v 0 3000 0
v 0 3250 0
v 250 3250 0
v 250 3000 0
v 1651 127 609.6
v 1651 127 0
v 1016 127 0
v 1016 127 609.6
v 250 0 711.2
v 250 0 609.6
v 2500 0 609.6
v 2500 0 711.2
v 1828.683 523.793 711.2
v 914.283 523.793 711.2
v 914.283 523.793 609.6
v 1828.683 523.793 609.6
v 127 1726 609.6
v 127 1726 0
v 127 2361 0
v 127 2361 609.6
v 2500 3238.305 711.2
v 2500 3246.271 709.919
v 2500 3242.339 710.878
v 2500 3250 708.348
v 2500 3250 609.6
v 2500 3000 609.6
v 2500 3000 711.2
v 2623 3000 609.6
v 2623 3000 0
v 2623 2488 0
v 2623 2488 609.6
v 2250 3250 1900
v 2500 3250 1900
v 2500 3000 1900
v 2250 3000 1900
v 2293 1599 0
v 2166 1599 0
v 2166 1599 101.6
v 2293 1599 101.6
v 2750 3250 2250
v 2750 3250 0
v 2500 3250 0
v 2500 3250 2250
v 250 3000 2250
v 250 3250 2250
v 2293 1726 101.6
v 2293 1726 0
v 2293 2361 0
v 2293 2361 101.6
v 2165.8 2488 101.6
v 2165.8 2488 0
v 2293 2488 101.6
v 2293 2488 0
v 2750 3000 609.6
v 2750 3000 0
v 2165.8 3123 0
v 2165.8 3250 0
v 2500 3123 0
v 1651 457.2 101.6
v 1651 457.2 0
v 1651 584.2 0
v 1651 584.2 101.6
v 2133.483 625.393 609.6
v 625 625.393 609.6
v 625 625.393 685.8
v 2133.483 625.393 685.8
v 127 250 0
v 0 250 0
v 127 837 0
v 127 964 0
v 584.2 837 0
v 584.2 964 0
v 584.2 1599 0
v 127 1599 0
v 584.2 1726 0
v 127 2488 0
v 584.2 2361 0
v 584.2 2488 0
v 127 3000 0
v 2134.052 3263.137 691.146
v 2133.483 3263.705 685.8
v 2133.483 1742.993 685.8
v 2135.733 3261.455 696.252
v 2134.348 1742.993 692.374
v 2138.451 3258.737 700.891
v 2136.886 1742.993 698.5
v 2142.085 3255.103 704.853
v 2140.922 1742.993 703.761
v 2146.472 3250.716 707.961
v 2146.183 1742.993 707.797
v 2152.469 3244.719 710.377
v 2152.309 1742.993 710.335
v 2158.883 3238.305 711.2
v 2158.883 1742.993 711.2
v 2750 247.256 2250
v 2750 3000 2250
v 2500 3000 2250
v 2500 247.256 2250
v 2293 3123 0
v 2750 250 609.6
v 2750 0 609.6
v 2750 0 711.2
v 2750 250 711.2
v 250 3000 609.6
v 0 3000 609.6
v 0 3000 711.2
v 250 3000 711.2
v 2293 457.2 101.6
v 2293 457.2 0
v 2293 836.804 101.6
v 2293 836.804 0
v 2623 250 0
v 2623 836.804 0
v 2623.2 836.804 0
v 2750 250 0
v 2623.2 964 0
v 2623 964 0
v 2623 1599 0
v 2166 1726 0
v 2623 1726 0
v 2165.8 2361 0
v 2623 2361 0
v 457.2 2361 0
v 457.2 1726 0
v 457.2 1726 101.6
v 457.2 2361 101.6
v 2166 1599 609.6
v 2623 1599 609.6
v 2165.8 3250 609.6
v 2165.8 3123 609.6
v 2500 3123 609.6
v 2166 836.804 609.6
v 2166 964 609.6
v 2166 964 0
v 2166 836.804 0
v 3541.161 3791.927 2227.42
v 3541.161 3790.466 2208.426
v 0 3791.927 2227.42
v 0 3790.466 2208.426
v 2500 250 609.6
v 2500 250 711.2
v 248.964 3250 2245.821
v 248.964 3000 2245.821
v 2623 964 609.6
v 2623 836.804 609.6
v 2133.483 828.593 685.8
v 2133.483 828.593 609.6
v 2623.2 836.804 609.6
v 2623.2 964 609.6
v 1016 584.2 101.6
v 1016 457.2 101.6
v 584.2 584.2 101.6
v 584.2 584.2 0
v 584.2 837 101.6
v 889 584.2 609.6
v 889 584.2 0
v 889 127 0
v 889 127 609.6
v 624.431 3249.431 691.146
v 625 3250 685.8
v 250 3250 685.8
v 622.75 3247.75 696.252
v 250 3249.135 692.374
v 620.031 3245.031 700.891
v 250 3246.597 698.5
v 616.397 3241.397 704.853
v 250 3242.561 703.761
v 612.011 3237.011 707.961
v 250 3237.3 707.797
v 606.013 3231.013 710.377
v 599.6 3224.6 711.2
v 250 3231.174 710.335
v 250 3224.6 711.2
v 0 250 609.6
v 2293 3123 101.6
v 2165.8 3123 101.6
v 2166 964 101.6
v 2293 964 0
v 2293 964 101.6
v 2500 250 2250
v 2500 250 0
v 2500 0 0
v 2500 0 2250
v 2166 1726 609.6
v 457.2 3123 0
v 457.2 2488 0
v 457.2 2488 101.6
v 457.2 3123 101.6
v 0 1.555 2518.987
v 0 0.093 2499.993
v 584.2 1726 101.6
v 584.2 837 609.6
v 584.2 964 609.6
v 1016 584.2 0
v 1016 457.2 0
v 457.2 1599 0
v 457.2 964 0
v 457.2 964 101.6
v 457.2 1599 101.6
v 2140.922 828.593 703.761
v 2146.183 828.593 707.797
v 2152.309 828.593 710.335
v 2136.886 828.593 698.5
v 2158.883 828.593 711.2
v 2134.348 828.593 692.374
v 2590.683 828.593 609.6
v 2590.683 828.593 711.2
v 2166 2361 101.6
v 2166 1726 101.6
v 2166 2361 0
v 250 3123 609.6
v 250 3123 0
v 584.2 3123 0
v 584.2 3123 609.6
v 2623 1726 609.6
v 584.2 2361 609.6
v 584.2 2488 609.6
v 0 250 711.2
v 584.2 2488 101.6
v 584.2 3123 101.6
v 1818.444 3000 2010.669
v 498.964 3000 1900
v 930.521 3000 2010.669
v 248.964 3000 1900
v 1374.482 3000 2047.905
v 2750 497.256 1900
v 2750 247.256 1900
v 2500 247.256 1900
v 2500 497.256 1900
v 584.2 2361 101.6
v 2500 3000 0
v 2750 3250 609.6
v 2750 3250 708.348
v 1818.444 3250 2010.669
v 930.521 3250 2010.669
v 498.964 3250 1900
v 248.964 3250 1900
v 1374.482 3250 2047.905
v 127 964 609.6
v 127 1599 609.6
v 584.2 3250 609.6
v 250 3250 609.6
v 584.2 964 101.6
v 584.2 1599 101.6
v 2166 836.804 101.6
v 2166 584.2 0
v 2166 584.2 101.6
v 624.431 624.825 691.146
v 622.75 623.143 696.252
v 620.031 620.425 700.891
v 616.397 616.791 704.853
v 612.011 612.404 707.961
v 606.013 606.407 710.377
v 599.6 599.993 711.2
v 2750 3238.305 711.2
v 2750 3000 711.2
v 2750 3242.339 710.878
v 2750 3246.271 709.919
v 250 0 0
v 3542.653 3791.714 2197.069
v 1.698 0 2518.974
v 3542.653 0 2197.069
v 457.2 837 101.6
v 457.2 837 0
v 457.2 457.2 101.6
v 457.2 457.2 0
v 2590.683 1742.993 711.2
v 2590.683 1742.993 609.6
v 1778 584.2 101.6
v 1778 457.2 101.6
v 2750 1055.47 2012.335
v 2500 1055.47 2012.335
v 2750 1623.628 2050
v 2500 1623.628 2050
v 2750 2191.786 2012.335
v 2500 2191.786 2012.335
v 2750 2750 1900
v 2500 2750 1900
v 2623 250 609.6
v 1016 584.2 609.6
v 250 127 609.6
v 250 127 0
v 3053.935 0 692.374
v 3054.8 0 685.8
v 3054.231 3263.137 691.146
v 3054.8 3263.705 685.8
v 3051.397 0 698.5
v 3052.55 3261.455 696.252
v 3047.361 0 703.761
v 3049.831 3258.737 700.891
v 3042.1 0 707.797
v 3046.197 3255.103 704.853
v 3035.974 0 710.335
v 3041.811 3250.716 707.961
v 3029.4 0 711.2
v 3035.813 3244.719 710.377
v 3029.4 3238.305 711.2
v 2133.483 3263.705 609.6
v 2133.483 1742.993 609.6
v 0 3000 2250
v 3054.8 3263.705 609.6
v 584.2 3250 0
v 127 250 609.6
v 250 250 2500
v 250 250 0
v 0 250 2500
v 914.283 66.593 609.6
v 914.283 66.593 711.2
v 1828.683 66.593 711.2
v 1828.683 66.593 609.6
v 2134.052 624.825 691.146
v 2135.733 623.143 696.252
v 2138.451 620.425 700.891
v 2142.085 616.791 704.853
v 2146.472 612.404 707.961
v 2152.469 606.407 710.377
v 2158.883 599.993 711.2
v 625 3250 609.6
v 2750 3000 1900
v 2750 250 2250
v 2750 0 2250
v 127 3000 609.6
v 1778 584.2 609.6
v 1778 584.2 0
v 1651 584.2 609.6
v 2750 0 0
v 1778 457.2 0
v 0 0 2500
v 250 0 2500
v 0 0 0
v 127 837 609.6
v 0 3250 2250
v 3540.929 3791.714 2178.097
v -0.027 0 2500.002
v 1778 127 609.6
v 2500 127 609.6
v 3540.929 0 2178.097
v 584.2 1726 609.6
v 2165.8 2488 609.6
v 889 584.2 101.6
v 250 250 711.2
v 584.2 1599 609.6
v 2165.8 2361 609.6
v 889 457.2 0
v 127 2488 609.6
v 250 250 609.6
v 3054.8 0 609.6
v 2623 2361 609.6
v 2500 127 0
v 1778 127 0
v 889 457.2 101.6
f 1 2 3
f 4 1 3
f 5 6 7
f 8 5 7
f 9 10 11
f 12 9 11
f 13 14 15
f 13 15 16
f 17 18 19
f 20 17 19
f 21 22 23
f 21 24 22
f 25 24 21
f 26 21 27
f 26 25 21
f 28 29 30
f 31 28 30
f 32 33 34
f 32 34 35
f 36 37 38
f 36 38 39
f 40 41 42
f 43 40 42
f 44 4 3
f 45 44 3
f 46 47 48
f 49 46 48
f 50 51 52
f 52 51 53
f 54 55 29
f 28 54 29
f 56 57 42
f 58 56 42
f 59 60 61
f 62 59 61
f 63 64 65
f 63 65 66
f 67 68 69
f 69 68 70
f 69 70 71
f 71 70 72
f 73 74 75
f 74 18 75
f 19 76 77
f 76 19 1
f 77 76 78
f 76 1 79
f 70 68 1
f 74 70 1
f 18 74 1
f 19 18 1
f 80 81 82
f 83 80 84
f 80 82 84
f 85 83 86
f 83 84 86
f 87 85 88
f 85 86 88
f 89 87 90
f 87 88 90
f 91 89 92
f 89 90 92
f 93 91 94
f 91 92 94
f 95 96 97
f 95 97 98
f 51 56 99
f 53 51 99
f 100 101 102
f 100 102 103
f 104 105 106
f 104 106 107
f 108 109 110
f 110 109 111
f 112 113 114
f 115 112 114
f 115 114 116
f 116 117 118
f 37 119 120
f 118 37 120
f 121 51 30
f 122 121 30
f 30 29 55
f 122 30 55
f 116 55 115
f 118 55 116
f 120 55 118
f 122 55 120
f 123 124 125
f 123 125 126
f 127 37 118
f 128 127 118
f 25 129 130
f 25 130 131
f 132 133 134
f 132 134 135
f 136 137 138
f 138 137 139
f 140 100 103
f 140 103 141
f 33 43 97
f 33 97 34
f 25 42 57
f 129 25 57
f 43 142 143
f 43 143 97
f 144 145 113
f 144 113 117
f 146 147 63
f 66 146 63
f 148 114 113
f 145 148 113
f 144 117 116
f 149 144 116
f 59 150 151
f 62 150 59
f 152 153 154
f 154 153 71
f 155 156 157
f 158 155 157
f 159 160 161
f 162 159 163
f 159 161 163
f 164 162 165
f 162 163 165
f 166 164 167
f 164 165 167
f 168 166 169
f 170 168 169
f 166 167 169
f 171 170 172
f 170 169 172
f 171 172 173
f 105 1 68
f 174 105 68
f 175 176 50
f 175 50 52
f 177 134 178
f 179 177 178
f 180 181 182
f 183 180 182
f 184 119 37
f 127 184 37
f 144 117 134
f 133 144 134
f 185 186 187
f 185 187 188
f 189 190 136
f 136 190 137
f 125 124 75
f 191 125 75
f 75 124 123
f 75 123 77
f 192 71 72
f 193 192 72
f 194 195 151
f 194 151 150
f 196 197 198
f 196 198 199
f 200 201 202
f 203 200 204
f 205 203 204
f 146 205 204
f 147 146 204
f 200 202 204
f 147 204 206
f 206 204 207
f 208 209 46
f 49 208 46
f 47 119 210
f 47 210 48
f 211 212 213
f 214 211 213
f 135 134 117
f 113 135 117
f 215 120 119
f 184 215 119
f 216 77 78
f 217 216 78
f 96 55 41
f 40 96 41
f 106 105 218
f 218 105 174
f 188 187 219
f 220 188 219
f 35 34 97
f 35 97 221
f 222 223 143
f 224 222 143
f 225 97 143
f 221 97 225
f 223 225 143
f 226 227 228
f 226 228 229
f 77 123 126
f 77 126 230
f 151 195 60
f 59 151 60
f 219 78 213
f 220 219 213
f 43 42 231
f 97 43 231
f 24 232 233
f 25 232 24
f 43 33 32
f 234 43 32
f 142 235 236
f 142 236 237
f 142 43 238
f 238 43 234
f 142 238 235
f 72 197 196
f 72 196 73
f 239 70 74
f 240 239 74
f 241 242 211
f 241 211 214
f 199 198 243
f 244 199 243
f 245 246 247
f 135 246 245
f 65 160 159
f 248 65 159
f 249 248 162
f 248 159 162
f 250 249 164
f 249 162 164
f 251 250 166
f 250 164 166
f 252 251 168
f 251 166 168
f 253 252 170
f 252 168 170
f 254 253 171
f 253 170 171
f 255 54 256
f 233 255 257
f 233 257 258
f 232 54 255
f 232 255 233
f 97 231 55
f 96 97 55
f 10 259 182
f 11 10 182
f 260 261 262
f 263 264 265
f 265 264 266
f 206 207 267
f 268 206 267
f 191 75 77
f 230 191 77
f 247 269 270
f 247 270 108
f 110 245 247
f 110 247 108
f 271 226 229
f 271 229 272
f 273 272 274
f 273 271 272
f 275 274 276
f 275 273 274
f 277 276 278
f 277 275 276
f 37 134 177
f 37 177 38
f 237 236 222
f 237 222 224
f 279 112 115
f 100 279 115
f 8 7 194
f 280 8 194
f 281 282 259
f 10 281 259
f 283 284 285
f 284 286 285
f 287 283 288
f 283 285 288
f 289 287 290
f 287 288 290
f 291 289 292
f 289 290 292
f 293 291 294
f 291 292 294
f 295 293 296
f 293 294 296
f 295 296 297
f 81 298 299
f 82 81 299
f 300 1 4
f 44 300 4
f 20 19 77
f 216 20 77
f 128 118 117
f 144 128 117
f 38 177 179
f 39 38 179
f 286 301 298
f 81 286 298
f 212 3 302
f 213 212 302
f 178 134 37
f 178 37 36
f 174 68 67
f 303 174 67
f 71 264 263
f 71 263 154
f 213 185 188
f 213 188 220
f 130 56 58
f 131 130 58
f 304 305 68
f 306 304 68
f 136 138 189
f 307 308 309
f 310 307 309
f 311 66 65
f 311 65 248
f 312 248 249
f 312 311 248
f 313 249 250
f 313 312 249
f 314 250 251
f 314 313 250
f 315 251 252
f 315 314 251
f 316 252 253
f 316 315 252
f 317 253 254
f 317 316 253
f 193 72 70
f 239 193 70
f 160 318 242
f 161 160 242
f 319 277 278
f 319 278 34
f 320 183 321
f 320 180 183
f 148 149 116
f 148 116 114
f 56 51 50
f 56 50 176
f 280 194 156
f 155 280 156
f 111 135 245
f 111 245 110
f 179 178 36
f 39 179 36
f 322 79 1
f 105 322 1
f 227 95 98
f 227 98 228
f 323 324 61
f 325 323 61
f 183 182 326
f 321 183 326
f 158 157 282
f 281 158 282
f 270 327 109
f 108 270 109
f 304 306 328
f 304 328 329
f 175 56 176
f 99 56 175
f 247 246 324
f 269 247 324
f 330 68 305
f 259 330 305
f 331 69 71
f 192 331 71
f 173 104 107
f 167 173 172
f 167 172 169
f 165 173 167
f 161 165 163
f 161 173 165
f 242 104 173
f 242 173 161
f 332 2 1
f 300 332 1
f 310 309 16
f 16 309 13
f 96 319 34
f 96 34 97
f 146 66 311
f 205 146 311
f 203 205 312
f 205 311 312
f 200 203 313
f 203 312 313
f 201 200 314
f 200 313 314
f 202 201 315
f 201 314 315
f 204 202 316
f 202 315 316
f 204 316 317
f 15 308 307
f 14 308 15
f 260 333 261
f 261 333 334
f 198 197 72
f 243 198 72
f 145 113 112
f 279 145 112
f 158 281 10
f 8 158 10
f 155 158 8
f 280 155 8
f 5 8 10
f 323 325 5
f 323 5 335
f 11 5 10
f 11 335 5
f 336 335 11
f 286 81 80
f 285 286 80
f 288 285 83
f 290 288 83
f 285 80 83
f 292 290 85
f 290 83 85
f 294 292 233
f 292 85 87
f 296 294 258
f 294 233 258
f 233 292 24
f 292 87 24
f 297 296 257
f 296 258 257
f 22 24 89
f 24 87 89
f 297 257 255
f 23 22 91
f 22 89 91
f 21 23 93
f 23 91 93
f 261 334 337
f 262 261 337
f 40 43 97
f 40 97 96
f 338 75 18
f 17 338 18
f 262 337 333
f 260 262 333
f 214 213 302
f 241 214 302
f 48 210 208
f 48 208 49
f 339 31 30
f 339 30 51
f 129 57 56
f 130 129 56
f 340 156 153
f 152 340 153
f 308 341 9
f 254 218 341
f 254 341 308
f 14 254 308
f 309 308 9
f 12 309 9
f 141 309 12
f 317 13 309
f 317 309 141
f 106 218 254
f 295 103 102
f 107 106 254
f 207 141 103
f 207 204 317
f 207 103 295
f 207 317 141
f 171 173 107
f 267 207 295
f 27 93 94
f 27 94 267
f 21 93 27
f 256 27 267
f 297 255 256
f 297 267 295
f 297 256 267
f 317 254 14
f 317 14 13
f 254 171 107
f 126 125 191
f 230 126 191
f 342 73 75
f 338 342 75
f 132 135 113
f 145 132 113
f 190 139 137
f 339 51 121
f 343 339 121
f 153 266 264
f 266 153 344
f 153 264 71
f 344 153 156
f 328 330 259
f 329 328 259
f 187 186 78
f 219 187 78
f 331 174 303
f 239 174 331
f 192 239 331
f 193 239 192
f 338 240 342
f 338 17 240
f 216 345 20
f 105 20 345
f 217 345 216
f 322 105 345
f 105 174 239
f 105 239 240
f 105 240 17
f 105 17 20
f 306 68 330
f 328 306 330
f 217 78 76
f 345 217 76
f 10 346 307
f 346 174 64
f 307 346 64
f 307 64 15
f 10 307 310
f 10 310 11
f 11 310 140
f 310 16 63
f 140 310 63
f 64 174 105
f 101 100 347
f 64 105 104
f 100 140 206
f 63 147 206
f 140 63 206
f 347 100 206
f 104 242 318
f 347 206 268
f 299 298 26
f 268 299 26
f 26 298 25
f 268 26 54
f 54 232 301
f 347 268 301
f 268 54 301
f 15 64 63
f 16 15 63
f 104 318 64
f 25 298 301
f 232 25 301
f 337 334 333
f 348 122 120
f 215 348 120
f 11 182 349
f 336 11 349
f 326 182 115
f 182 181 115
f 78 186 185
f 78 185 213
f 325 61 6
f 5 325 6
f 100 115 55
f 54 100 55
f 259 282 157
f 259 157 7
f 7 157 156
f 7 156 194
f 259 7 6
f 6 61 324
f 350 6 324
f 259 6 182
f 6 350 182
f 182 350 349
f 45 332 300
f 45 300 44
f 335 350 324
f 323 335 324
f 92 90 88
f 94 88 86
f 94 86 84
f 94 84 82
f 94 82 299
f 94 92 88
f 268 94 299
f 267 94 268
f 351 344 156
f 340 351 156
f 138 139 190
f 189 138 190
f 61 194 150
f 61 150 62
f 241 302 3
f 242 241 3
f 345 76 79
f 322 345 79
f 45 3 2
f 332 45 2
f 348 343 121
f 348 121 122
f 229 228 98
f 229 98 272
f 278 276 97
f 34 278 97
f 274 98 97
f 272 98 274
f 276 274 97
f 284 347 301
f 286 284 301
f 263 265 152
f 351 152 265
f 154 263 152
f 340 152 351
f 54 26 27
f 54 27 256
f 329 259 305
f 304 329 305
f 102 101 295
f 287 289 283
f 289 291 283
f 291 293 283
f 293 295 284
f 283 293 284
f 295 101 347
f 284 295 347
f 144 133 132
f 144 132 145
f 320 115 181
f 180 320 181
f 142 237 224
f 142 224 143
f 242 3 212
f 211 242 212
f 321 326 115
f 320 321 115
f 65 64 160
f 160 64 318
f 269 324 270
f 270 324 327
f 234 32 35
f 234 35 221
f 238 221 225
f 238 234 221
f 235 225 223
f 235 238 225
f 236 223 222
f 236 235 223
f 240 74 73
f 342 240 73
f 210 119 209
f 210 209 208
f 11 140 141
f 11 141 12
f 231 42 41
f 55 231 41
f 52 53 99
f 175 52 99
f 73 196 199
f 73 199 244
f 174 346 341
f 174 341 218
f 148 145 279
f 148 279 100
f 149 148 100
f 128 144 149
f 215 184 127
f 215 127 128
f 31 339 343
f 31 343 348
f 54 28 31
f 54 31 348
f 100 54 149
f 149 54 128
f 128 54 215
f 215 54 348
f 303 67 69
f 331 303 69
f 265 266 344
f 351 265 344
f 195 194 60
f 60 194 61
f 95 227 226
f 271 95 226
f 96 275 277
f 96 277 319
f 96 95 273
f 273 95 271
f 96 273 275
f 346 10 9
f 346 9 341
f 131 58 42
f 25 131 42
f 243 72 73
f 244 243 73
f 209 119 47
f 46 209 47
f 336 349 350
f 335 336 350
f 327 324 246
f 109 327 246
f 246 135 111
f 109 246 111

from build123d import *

# Parameters (mm, degrees)
F1_DEPTH  = 2500
F2_DEPTH  = 2250
F3_DEPTH  = 2250
F4_DEPTH  = 2250
F5_DEPTH  = 609.6
F0_W      = 127
F0_H      = 635
F6_DEPTH  = 101.6
F0_H_2    = 252.8
F0_W_2    = 635
F0_H_3    = 127
F0_H_4    = 252.6044269804
F0_W_3    = 127.2
F7_W      = 1508.4825573363
F7_H      = 625.393493561
F8_DEPTH  = 101.6
F9_R      = 25.4
F13_DEPTH = 250
F15_DEPTH = 250
F17_DEPTH = 19.05
F19_DEPTH = 19.05
F20_W     = 457.2
F20_H     = 914.4
F21_DEPTH = 101.6
F22_W     = 914.4
F22_H     = 457.2
F23_DEPTH = 101.6


with BuildPart() as f1:
    # F0 (on Top) → F1 (new body)
    with BuildSketch(Plane.XY):
        Polygon((0, 250), (0, 0), (250, 0), (250, 127), (250, 250), (127, 250), align=None)
    extrude(amount=F1_DEPTH)


with BuildPart() as f2:
    # F0 (on Top) → F2 (new body)
    with BuildSketch(Plane.XY):
        Polygon((0, 3250), (0, 3000), (127, 3000), (250, 3000), (250, 3123), (250, 3250), (127, 3250), align=None)
    extrude(amount=F2_DEPTH)


with BuildPart() as f3:
    # F0 (on Top) → F3 (new body)
    with BuildSketch(Plane.XY):
        Polygon((2500, 127), (2500, 0), (2750, 0), (2750, 127), (2750, 250), (2623, 250), (2500, 250), align=None)
    extrude(amount=F3_DEPTH)


with BuildPart() as f4:
    # F0 (on Top) → F4 (new body)
    with BuildSketch(Plane.XY):
        Polygon((2623, 3000), (2750, 3000), (2750, 3250), (2623, 3250), (2500, 3250), (2500, 3123), (2500, 3000), align=None)
    extrude(amount=F4_DEPTH)


with BuildPart() as f5:
    # F0 (on Top) → F5 (new body)
    with BuildSketch(Plane.XY):
        Polygon((584.2, 3250), (250, 3250), (250, 3123), (457.2, 3123), (584.2, 3123), align=None)
    extrude(amount=F5_DEPTH)


with BuildPart() as f5b:
    # F0 (on Top) → F5, piece 2 (new body)
    with BuildSketch(Plane.XY):
        Polygon((0, 3000), (0, 250), (127, 250), (127, 837), (127, 964), (127, 1599), (127, 1726), (127, 2361), (127, 2488), (127, 3000), align=None)
        Polygon((457.2, 2488), (127, 2488), (127, 2361), (457.2, 2361), (584.2, 2361), (584.2, 2488), align=None)
        Polygon((127, 1726), (127, 1599), (457.2, 1599), (584.2, 1599), (584.2, 1726), (457.2, 1726), align=None)
        Polygon((127, 964), (127, 837), (457.2, 837), (584.2, 837), (584.2, 964), (457.2, 964), align=None)
    extrude(amount=F5_DEPTH)


with BuildPart() as f5c:
    # F0 (on Top) → F5, piece 3 (new body)
    with BuildSketch(Plane.XY):
        Polygon((889, 457.2), (889, 127), (1016, 127), (1016, 457.2), (1016, 584.2), (889, 584.2), align=None)
        Polygon((1651, 127), (1778, 127), (1778, 457.2), (1778, 584.2), (1651, 584.2), (1651, 457.2), align=None)
        Polygon((250, 127), (250, 0), (2500, 0), (2500, 127), (1778, 127), (1651, 127), (1016, 127), (889, 127), align=None)
    extrude(amount=F5_DEPTH)


with BuildPart() as f5d:
    # F0 (on Top) → F5, piece 4 (new body)
    with BuildSketch(Plane.XY):
        Polygon((2623, 836.8044269804), (2623, 250), (2750, 250), (2750, 3000), (2623, 3000), (2623, 2488), (2623, 2361), (2623, 1726), (2623, 1599), (2623, 964), (2623.2, 964), (2623.2, 836.8044269804), align=None)
        Polygon((2293, 1599), (2623, 1599), (2623, 1726), (2293, 1726), (2166, 1726), (2166, 1599), align=None)
        Polygon((2623, 2361), (2623, 2488), (2293, 2488), (2165.8, 2488), (2165.8, 2361), (2166, 2361), (2293, 2361), align=None)
    extrude(amount=F5_DEPTH)


with BuildPart() as f5e:
    # F0 (on Top) → F5, piece 5 (new body)
    with BuildSketch(Plane.XY):
        Polygon((2293, 836.8044269804), (2623, 836.8044269804), (2623, 964), (2293, 964), (2166, 964), (2166, 836.8044269804), align=None)
    extrude(amount=F5_DEPTH)


with BuildPart() as f5f:
    # F0 (on Top) → F5, piece 6 (new body)
    with BuildSketch(Plane.XY):
        Polygon((2293, 3123), (2500, 3123), (2500, 3250), (2165.8, 3250), (2165.8, 3123), align=None)
    extrude(amount=F5_DEPTH)


with BuildPart() as f6:
    # F0 (on Top) → F6 (new body)
    with BuildSketch(Plane.XY):
        with Locations((520.7, 2805.5)):
            Rectangle(F0_W, F0_H)
    extrude(amount=F6_DEPTH)


with BuildPart() as f6b:
    # F0 (on Top) → F6, piece 2 (new body)
    with BuildSketch(Plane.XY):
        with Locations((520.7, 2043.5)):
            Rectangle(F0_W, F0_H)
    extrude(amount=F6_DEPTH)


with BuildPart() as f6c:
    # F0 (on Top) → F6, piece 3 (new body)
    with BuildSketch(Plane.XY):
        with Locations((520.7, 1281.5)):
            Rectangle(F0_W, F0_H)
    extrude(amount=F6_DEPTH)


with BuildPart() as f6d:
    # F0 (on Top) → F6, piece 4 (new body)
    with BuildSketch(Plane.XY):
        with Locations((520.7, 710.6)):
            Rectangle(F0_W, F0_H_2)
        Polygon((457.2, 457.2), (889, 457.2), (889, 584.2), (584.2, 584.2), (457.2, 584.2), align=None)
    extrude(amount=F6_DEPTH)


with BuildPart() as f6e:
    # F0 (on Top) → F6, piece 5 (new body)
    with BuildSketch(Plane.XY):
        with Locations((1333.5, 520.7)):
            Rectangle(F0_W_2, F0_H_3)
    extrude(amount=F6_DEPTH)


with BuildPart() as f6f:
    # F0 (on Top) → F6, piece 6 (new body)
    with BuildSketch(Plane.XY):
        Polygon((1778, 584.2), (1778, 457.2), (2293, 457.2), (2293, 584.2), (2166, 584.2), align=None)
        with Locations((2229.5, 710.5022134902)):
            Rectangle(F0_W, F0_H_4)
    extrude(amount=F6_DEPTH)


with BuildPart() as f6g:
    # F0 (on Top) → F6, piece 7 (new body)
    with BuildSketch(Plane.XY):
        with Locations((2229.5, 1281.5)):
            Rectangle(F0_W, F0_H)
    extrude(amount=F6_DEPTH)


with BuildPart() as f6h:
    # F0 (on Top) → F6, piece 8 (new body)
    with BuildSketch(Plane.XY):
        with Locations((2229.5, 2043.5)):
            Rectangle(F0_W, F0_H)
    extrude(amount=F6_DEPTH)


with BuildPart() as f6i:
    # F0 (on Top) → F6, piece 9 (new body)
    with BuildSketch(Plane.XY):
        with Locations((2229.4, 2805.5)):
            Rectangle(F0_W_3, F0_H)
    extrude(amount=F6_DEPTH)


with BuildPart() as f8:
    # F7 (on face) → F8 (new body)
    with BuildSketch(Plane.XY.offset(609.6)):
        Polygon((0, 3250), (0, 0), (625, 0), (625, 625.393493561), (625, 3250), align=None)
        with Locations((1379.2412786681, 312.6967467805)):
            Rectangle(F7_W, F7_H)
        Polygon((2133.4825573363, 625.393493561), (2133.4825573363, 0), (3054.8, 0), (3054.8, 3263.7054706946), (2133.4825573363, 3263.7054706946), align=None)
    extrude(amount=F8_DEPTH)

    # F9
    f9_edges = [f8.edges().sort_by_distance(p)[0] for p in [
        (3054.8, 1631.852735, 711.2),
        (2594.141279, 3263.705471, 711.2),
        (625, 1937.696747, 711.2),
        (312.5, 3250, 711.2),
        (1379.241279, 625.393494, 711.2),
        (2133.482557, 1944.549482, 711.2),
    ]]
    fillet(f9_edges, radius=F9_R)

    # F20 (on face) → F21 (cut, through all)
    with BuildSketch(Plane.XY.offset(711.2)):
        with Locations((2362.0825573363, 1285.793493561)):
            Rectangle(F20_W, F20_H)
    extrude(amount=-F21_DEPTH, mode=Mode.SUBTRACT)

    # F22 (on face) → F23 (cut, through all)
    with BuildSketch(Plane.XY.offset(711.2)):
        with Locations((1371.4825573363, 295.193493561)):
            Rectangle(F22_W, F22_H)
    extrude(amount=-F23_DEPTH, mode=Mode.SUBTRACT)

    # F24: cut F2, F4, F3, F1
    add(f2.part, mode=Mode.SUBTRACT)
    add(f4.part, mode=Mode.SUBTRACT)
    add(f3.part, mode=Mode.SUBTRACT)
    add(f1.part, mode=Mode.SUBTRACT)


with BuildPart() as f13:
    # F12 (on face) → F13 (new body)
    with BuildSketch(Plane.YZ.offset(2750)):
        with BuildLine():
            Line((247.2558619949, 2250), (247.2558619949, 1900))
            Line((247.2558619949, 1900), (497.2558619949, 1900))
            ThreePointArc((497.2558619949, 1900), (1623.6279309974, 2050), (2750, 1900))
            Line((2750, 1900), (3000, 1900))
            Line((3000, 1900), (3000, 2250))
            Line((3000, 2250), (247.2558619949, 2250))
        make_face()
    extrude(amount=-F13_DEPTH)


with BuildPart() as f15:
    # F14 (on face) → F15 (new body)
    with BuildSketch(Plane(origin=(0, 3250, 0), x_dir=(-1, 0, 0), z_dir=(0, 1, 0))):
        with BuildLine():
            Line((-248.9643245936, 2245.820865417), (-2500, 2250))
            Line((-2500, 2250), (-2500, 1900))
            Line((-2500, 1900), (-2250, 1900))
            ThreePointArc((-2250, 1900), (-1374.4821622968, 2047.9054948492), (-498.9643245936, 1900))
            Line((-498.9643245936, 1900), (-248.9643245936, 1900))
            Line((-248.9643245936, 1900), (-248.9643245936, 2245.820865417))
        make_face()
    extrude(amount=-F15_DEPTH)


with BuildPart() as f17:
    # F16 (on 3pt) → F17 (new body)
    with BuildSketch(Plane(origin=(0, 191.1764705882, 2485.2941176471), x_dir=(1, 0, 0), z_dir=(0, 0.0766964989, 0.9970544855))):
        Polygon((0, 3609.922170639), (0, -191.6475147009), (3541.1608219147, 3609.922170639), align=None)
    extrude(amount=F17_DEPTH)


with BuildPart() as f19:
    # F18 (on 3pt) → F19 (new body)
    with BuildSketch(Plane(origin=(225.4098360656, 0, 2479.5081967213), x_dir=(0.9958932065, 0, -0.090535746), z_dir=(0.090535746, 0, 0.9958932065))):
        Polygon((3329.1909694672, 3791.7137145996), (-226.3661175966, 0), (3329.1909694672, 0), align=None)
    extrude(amount=F19_DEPTH)


solid = Compound([f1.part, f2.part, f3.part, f4.part, f5.part, f5b.part, f5c.part, f5d.part, f5e.part, f5f.part, f6.part, f6b.part, f6c.part, f6d.part, f6e.part, f6f.part, f6g.part, f6h.part, f6i.part, f8.part, f13.part, f15.part, f17.part, f19.part])
